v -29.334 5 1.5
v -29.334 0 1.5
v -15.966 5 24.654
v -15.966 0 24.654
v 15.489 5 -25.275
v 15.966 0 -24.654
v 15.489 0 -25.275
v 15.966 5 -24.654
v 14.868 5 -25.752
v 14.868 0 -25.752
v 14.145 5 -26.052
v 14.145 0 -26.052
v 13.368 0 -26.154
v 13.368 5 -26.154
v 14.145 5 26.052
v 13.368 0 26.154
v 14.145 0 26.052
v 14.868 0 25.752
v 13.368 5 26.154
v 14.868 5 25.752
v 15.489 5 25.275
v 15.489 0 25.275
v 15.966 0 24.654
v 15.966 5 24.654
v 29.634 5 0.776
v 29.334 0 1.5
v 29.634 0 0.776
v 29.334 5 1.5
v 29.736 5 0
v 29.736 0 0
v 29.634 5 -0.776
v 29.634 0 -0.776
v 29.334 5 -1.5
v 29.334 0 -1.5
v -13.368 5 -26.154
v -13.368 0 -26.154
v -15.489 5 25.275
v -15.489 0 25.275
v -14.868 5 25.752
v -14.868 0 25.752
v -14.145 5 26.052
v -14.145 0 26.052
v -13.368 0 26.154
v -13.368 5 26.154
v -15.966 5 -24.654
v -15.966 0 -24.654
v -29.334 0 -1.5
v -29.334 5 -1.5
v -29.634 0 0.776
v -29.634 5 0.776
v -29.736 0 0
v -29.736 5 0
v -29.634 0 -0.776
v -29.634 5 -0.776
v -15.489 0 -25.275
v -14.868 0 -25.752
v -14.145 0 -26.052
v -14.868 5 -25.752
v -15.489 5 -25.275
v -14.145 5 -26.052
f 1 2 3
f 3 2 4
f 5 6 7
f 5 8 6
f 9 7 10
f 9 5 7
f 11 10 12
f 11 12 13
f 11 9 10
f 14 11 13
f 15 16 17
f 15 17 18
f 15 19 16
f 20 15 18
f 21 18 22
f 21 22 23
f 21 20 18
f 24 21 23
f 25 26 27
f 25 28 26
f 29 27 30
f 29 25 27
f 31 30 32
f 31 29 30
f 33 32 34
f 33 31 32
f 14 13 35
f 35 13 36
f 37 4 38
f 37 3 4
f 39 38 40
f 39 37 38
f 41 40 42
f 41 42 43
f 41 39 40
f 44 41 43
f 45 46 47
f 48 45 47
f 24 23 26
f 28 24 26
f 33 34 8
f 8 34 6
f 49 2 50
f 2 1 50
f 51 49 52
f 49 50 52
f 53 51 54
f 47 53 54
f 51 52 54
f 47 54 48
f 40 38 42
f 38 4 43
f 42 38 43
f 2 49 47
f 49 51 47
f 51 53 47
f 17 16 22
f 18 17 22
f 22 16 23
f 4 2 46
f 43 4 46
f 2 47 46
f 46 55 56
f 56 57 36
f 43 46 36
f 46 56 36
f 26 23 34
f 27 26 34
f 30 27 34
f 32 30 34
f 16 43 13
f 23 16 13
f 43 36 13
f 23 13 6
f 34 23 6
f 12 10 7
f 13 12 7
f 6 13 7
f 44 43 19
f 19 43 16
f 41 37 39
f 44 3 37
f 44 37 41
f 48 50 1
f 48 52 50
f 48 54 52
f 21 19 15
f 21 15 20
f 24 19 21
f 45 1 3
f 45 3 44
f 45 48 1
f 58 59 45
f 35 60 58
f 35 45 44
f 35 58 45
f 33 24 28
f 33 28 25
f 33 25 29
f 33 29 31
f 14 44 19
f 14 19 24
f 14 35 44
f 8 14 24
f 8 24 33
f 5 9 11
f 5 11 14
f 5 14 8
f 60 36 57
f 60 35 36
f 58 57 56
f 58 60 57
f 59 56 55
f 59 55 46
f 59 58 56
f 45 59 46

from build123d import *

# Parameters (mm, degrees)
BOSS_EXTRUDE1_DEPTH = 5
FILLET1_R           = 3


with BuildPart() as part:
    # Sketch1 → Boss-Extrude1 (new body)
    with BuildSketch(Plane(origin=(0, 0, 0), x_dir=(1, 0, 0), z_dir=(0, 1, 0))):
        Polygon((-30.200218536, 0), (-15.100109268, -26.154156452), (15.100109268, -26.154156452), (30.200218536, 0), (15.100109268, 26.154156452), (-15.100109268, 26.154156452), align=None)
    extrude(amount=BOSS_EXTRUDE1_DEPTH)

    # Fillet1
    fillet1_edges = [part.edges().sort_by_distance(p)[0] for p in [
        (-15.100109268, 2.5, -26.154156452),
        (15.100109268, 2.5, -26.154156452),
        (30.200218536, 2.5, 0),
        (15.100109268, 2.5, 26.154156452),
        (-15.100109268, 2.5, 26.154156452),
        (-30.200218536, 2.5, 0),
    ]]
    fillet(fillet1_edges, radius=FILLET1_R)


solid = part.part
